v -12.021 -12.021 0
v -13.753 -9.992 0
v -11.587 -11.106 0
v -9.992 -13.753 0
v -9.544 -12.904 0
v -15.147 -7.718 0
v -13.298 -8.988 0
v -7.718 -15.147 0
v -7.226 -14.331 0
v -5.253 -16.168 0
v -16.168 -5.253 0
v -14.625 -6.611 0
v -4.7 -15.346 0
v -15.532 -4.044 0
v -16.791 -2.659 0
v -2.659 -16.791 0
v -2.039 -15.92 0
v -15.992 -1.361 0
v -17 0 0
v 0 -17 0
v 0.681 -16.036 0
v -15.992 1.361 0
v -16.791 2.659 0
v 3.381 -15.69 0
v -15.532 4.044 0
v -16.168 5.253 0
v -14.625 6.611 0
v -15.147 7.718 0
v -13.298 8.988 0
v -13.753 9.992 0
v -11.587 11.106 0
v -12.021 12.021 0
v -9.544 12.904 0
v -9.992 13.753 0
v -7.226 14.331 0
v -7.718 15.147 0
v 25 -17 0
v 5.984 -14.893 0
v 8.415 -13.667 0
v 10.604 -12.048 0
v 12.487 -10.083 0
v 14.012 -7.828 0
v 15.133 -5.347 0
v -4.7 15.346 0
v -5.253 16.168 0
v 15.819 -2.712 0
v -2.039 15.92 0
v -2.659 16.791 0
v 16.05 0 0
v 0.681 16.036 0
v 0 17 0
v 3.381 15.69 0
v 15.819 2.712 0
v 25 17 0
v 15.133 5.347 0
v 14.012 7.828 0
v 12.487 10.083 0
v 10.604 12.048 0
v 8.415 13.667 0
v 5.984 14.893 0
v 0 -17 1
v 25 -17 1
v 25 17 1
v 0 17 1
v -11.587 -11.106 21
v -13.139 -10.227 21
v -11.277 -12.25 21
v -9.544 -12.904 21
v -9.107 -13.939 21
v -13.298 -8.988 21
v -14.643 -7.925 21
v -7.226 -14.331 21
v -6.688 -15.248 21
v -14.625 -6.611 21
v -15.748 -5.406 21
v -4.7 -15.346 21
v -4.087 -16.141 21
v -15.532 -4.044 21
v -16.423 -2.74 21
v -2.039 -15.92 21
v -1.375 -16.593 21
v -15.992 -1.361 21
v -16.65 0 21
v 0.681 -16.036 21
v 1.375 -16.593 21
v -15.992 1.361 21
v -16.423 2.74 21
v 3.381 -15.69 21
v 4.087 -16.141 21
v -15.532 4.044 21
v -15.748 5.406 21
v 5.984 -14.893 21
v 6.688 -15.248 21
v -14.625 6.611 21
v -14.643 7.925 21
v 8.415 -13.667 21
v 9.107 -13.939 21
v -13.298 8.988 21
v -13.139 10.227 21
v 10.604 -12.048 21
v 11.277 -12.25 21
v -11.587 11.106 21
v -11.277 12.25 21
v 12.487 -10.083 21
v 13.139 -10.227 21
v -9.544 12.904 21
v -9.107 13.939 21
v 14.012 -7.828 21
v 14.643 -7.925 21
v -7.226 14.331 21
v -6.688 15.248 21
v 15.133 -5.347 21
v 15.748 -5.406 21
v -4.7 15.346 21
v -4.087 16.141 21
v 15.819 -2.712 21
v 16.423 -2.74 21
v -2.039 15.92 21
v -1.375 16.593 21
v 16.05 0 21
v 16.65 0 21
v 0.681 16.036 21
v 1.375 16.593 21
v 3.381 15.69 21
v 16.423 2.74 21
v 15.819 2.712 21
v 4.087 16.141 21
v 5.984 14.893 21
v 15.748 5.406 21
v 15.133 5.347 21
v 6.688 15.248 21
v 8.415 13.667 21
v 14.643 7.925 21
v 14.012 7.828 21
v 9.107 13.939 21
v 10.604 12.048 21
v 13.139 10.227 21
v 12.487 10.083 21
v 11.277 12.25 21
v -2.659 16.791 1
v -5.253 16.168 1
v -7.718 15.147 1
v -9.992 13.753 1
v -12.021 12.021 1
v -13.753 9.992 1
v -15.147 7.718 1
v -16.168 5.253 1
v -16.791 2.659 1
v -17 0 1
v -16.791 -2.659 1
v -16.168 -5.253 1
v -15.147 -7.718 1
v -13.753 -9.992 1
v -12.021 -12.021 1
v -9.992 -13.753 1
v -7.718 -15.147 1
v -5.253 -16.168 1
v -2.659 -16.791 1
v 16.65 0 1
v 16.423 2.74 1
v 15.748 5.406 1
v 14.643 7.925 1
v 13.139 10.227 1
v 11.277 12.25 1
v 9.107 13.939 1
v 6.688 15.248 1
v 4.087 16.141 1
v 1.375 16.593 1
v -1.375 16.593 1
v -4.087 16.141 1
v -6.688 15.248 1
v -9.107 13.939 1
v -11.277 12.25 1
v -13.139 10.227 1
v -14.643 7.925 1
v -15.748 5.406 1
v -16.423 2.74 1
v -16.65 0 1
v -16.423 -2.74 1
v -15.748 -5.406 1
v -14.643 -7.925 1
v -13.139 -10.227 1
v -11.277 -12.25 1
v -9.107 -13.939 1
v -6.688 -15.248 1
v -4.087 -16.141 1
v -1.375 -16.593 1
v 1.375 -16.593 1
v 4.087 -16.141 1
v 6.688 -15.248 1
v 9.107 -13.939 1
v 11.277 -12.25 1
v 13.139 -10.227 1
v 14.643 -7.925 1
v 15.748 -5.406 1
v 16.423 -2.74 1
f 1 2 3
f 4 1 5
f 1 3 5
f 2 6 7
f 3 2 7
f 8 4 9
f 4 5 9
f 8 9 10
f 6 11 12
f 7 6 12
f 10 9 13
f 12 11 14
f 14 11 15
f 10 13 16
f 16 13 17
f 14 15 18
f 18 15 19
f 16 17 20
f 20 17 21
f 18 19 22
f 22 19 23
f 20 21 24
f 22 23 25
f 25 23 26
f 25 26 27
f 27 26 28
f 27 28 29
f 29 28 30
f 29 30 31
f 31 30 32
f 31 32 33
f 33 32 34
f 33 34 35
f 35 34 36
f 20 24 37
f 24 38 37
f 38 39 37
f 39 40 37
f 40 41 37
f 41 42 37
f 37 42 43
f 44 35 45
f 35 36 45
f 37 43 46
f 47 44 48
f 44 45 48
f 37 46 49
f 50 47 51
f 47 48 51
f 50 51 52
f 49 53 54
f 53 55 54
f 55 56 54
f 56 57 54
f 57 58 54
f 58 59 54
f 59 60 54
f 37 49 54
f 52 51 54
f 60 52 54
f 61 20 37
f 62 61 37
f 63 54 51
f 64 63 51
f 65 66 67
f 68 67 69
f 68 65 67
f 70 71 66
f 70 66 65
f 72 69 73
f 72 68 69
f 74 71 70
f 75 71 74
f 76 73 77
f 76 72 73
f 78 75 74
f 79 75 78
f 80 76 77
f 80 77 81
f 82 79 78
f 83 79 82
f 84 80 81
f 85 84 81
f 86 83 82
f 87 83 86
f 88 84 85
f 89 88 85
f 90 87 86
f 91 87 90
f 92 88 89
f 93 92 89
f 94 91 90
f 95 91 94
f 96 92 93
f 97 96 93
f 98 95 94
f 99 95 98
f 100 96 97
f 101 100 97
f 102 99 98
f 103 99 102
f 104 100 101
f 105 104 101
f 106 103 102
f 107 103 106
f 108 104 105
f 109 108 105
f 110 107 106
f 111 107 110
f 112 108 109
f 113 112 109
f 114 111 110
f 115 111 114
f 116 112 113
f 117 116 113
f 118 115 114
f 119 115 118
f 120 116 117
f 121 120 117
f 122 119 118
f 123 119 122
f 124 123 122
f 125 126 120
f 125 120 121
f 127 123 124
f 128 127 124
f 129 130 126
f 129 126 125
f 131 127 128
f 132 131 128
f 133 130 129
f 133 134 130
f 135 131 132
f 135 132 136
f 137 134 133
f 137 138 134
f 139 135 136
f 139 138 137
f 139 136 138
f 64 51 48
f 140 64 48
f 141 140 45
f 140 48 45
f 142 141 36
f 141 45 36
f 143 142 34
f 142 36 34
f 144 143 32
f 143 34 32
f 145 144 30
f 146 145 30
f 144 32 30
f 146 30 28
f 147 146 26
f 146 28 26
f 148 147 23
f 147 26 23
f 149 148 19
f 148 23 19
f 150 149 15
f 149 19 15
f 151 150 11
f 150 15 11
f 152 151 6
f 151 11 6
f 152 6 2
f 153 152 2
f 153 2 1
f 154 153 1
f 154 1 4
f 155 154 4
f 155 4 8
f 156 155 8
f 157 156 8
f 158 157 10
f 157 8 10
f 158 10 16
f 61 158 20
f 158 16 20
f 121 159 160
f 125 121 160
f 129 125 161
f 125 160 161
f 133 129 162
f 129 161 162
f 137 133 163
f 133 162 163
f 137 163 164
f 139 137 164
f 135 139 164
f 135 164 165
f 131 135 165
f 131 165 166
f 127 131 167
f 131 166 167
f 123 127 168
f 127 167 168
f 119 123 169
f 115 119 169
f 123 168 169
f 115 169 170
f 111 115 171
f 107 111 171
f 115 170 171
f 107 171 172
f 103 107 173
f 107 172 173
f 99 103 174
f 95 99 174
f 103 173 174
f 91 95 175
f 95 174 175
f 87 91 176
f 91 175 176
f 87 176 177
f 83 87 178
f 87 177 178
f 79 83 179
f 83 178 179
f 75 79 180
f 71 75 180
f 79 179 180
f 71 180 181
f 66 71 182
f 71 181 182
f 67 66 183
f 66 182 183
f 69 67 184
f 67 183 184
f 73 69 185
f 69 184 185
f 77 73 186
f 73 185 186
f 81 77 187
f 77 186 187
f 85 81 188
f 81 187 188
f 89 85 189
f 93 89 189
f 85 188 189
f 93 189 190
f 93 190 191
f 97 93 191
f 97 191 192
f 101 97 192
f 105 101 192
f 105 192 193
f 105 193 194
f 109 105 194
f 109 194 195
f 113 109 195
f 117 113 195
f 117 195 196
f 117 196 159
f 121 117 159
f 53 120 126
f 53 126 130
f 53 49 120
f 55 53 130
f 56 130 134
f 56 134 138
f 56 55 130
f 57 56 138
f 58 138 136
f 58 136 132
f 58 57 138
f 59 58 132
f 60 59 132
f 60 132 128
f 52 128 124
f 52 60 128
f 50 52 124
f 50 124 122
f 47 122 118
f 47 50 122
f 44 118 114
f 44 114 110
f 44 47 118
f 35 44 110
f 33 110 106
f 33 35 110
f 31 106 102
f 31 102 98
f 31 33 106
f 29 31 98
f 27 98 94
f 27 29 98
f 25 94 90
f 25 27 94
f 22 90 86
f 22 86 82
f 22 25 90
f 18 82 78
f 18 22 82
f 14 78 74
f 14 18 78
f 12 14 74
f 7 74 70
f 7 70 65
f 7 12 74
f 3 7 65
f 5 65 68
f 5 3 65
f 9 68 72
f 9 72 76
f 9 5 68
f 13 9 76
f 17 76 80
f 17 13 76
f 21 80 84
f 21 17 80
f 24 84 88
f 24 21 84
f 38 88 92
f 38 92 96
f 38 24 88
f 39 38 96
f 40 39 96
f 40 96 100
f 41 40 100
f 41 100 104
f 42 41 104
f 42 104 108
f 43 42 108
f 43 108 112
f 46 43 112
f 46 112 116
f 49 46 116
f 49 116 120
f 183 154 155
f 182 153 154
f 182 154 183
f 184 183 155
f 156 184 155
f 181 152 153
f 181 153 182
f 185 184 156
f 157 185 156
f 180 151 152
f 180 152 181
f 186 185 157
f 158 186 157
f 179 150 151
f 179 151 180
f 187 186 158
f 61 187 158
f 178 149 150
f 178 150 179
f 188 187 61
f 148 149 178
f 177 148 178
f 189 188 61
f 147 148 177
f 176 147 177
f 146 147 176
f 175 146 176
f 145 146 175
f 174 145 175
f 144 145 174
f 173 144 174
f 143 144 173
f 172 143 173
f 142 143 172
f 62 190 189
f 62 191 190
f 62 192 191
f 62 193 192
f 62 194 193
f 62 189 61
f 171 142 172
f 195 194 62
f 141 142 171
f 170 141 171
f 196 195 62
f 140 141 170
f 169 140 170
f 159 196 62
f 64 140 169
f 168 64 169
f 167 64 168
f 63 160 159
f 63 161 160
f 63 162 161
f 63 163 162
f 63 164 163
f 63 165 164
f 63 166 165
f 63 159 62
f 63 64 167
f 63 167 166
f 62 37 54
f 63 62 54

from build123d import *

# Parameters (mm, degrees)
F0_R     = 16.05
F1_DEPTH = 1
F2_R     = 16.65
F2_R_2   = 16.05
F3_DEPTH = 20


with BuildPart() as f1:
    # F0 (on Top) → F1 (new body)
    with BuildSketch(Plane.XY):
        with BuildLine():
            ThreePointArc((0, -17), (12.020815, -12.020815), (17, 0))
            ThreePointArc((17, 0), (12.020815, 12.020815), (0, 17))
            ThreePointArc((0, 17), (-17, 0), (0, -17))
        make_face()
        Circle(F0_R, mode=Mode.SUBTRACT)
        with BuildLine():
            ThreePointArc((0, 17), (12.020815, 12.020815), (17, 0))
            ThreePointArc((17, 0), (12.020815, -12.020815), (0, -17))
            Line((0, -17), (25, -17))
            Line((25, -17), (25, 17))
            Line((25, 17), (0, 17))
        make_face()
    extrude(amount=F1_DEPTH)

    # F2 (on face) → F3 (join)
    with BuildSketch(Plane.XY.offset(1)):
        Circle(F2_R)
        Circle(F2_R_2, mode=Mode.SUBTRACT)
    extrude(amount=F3_DEPTH)


solid = f1.part
